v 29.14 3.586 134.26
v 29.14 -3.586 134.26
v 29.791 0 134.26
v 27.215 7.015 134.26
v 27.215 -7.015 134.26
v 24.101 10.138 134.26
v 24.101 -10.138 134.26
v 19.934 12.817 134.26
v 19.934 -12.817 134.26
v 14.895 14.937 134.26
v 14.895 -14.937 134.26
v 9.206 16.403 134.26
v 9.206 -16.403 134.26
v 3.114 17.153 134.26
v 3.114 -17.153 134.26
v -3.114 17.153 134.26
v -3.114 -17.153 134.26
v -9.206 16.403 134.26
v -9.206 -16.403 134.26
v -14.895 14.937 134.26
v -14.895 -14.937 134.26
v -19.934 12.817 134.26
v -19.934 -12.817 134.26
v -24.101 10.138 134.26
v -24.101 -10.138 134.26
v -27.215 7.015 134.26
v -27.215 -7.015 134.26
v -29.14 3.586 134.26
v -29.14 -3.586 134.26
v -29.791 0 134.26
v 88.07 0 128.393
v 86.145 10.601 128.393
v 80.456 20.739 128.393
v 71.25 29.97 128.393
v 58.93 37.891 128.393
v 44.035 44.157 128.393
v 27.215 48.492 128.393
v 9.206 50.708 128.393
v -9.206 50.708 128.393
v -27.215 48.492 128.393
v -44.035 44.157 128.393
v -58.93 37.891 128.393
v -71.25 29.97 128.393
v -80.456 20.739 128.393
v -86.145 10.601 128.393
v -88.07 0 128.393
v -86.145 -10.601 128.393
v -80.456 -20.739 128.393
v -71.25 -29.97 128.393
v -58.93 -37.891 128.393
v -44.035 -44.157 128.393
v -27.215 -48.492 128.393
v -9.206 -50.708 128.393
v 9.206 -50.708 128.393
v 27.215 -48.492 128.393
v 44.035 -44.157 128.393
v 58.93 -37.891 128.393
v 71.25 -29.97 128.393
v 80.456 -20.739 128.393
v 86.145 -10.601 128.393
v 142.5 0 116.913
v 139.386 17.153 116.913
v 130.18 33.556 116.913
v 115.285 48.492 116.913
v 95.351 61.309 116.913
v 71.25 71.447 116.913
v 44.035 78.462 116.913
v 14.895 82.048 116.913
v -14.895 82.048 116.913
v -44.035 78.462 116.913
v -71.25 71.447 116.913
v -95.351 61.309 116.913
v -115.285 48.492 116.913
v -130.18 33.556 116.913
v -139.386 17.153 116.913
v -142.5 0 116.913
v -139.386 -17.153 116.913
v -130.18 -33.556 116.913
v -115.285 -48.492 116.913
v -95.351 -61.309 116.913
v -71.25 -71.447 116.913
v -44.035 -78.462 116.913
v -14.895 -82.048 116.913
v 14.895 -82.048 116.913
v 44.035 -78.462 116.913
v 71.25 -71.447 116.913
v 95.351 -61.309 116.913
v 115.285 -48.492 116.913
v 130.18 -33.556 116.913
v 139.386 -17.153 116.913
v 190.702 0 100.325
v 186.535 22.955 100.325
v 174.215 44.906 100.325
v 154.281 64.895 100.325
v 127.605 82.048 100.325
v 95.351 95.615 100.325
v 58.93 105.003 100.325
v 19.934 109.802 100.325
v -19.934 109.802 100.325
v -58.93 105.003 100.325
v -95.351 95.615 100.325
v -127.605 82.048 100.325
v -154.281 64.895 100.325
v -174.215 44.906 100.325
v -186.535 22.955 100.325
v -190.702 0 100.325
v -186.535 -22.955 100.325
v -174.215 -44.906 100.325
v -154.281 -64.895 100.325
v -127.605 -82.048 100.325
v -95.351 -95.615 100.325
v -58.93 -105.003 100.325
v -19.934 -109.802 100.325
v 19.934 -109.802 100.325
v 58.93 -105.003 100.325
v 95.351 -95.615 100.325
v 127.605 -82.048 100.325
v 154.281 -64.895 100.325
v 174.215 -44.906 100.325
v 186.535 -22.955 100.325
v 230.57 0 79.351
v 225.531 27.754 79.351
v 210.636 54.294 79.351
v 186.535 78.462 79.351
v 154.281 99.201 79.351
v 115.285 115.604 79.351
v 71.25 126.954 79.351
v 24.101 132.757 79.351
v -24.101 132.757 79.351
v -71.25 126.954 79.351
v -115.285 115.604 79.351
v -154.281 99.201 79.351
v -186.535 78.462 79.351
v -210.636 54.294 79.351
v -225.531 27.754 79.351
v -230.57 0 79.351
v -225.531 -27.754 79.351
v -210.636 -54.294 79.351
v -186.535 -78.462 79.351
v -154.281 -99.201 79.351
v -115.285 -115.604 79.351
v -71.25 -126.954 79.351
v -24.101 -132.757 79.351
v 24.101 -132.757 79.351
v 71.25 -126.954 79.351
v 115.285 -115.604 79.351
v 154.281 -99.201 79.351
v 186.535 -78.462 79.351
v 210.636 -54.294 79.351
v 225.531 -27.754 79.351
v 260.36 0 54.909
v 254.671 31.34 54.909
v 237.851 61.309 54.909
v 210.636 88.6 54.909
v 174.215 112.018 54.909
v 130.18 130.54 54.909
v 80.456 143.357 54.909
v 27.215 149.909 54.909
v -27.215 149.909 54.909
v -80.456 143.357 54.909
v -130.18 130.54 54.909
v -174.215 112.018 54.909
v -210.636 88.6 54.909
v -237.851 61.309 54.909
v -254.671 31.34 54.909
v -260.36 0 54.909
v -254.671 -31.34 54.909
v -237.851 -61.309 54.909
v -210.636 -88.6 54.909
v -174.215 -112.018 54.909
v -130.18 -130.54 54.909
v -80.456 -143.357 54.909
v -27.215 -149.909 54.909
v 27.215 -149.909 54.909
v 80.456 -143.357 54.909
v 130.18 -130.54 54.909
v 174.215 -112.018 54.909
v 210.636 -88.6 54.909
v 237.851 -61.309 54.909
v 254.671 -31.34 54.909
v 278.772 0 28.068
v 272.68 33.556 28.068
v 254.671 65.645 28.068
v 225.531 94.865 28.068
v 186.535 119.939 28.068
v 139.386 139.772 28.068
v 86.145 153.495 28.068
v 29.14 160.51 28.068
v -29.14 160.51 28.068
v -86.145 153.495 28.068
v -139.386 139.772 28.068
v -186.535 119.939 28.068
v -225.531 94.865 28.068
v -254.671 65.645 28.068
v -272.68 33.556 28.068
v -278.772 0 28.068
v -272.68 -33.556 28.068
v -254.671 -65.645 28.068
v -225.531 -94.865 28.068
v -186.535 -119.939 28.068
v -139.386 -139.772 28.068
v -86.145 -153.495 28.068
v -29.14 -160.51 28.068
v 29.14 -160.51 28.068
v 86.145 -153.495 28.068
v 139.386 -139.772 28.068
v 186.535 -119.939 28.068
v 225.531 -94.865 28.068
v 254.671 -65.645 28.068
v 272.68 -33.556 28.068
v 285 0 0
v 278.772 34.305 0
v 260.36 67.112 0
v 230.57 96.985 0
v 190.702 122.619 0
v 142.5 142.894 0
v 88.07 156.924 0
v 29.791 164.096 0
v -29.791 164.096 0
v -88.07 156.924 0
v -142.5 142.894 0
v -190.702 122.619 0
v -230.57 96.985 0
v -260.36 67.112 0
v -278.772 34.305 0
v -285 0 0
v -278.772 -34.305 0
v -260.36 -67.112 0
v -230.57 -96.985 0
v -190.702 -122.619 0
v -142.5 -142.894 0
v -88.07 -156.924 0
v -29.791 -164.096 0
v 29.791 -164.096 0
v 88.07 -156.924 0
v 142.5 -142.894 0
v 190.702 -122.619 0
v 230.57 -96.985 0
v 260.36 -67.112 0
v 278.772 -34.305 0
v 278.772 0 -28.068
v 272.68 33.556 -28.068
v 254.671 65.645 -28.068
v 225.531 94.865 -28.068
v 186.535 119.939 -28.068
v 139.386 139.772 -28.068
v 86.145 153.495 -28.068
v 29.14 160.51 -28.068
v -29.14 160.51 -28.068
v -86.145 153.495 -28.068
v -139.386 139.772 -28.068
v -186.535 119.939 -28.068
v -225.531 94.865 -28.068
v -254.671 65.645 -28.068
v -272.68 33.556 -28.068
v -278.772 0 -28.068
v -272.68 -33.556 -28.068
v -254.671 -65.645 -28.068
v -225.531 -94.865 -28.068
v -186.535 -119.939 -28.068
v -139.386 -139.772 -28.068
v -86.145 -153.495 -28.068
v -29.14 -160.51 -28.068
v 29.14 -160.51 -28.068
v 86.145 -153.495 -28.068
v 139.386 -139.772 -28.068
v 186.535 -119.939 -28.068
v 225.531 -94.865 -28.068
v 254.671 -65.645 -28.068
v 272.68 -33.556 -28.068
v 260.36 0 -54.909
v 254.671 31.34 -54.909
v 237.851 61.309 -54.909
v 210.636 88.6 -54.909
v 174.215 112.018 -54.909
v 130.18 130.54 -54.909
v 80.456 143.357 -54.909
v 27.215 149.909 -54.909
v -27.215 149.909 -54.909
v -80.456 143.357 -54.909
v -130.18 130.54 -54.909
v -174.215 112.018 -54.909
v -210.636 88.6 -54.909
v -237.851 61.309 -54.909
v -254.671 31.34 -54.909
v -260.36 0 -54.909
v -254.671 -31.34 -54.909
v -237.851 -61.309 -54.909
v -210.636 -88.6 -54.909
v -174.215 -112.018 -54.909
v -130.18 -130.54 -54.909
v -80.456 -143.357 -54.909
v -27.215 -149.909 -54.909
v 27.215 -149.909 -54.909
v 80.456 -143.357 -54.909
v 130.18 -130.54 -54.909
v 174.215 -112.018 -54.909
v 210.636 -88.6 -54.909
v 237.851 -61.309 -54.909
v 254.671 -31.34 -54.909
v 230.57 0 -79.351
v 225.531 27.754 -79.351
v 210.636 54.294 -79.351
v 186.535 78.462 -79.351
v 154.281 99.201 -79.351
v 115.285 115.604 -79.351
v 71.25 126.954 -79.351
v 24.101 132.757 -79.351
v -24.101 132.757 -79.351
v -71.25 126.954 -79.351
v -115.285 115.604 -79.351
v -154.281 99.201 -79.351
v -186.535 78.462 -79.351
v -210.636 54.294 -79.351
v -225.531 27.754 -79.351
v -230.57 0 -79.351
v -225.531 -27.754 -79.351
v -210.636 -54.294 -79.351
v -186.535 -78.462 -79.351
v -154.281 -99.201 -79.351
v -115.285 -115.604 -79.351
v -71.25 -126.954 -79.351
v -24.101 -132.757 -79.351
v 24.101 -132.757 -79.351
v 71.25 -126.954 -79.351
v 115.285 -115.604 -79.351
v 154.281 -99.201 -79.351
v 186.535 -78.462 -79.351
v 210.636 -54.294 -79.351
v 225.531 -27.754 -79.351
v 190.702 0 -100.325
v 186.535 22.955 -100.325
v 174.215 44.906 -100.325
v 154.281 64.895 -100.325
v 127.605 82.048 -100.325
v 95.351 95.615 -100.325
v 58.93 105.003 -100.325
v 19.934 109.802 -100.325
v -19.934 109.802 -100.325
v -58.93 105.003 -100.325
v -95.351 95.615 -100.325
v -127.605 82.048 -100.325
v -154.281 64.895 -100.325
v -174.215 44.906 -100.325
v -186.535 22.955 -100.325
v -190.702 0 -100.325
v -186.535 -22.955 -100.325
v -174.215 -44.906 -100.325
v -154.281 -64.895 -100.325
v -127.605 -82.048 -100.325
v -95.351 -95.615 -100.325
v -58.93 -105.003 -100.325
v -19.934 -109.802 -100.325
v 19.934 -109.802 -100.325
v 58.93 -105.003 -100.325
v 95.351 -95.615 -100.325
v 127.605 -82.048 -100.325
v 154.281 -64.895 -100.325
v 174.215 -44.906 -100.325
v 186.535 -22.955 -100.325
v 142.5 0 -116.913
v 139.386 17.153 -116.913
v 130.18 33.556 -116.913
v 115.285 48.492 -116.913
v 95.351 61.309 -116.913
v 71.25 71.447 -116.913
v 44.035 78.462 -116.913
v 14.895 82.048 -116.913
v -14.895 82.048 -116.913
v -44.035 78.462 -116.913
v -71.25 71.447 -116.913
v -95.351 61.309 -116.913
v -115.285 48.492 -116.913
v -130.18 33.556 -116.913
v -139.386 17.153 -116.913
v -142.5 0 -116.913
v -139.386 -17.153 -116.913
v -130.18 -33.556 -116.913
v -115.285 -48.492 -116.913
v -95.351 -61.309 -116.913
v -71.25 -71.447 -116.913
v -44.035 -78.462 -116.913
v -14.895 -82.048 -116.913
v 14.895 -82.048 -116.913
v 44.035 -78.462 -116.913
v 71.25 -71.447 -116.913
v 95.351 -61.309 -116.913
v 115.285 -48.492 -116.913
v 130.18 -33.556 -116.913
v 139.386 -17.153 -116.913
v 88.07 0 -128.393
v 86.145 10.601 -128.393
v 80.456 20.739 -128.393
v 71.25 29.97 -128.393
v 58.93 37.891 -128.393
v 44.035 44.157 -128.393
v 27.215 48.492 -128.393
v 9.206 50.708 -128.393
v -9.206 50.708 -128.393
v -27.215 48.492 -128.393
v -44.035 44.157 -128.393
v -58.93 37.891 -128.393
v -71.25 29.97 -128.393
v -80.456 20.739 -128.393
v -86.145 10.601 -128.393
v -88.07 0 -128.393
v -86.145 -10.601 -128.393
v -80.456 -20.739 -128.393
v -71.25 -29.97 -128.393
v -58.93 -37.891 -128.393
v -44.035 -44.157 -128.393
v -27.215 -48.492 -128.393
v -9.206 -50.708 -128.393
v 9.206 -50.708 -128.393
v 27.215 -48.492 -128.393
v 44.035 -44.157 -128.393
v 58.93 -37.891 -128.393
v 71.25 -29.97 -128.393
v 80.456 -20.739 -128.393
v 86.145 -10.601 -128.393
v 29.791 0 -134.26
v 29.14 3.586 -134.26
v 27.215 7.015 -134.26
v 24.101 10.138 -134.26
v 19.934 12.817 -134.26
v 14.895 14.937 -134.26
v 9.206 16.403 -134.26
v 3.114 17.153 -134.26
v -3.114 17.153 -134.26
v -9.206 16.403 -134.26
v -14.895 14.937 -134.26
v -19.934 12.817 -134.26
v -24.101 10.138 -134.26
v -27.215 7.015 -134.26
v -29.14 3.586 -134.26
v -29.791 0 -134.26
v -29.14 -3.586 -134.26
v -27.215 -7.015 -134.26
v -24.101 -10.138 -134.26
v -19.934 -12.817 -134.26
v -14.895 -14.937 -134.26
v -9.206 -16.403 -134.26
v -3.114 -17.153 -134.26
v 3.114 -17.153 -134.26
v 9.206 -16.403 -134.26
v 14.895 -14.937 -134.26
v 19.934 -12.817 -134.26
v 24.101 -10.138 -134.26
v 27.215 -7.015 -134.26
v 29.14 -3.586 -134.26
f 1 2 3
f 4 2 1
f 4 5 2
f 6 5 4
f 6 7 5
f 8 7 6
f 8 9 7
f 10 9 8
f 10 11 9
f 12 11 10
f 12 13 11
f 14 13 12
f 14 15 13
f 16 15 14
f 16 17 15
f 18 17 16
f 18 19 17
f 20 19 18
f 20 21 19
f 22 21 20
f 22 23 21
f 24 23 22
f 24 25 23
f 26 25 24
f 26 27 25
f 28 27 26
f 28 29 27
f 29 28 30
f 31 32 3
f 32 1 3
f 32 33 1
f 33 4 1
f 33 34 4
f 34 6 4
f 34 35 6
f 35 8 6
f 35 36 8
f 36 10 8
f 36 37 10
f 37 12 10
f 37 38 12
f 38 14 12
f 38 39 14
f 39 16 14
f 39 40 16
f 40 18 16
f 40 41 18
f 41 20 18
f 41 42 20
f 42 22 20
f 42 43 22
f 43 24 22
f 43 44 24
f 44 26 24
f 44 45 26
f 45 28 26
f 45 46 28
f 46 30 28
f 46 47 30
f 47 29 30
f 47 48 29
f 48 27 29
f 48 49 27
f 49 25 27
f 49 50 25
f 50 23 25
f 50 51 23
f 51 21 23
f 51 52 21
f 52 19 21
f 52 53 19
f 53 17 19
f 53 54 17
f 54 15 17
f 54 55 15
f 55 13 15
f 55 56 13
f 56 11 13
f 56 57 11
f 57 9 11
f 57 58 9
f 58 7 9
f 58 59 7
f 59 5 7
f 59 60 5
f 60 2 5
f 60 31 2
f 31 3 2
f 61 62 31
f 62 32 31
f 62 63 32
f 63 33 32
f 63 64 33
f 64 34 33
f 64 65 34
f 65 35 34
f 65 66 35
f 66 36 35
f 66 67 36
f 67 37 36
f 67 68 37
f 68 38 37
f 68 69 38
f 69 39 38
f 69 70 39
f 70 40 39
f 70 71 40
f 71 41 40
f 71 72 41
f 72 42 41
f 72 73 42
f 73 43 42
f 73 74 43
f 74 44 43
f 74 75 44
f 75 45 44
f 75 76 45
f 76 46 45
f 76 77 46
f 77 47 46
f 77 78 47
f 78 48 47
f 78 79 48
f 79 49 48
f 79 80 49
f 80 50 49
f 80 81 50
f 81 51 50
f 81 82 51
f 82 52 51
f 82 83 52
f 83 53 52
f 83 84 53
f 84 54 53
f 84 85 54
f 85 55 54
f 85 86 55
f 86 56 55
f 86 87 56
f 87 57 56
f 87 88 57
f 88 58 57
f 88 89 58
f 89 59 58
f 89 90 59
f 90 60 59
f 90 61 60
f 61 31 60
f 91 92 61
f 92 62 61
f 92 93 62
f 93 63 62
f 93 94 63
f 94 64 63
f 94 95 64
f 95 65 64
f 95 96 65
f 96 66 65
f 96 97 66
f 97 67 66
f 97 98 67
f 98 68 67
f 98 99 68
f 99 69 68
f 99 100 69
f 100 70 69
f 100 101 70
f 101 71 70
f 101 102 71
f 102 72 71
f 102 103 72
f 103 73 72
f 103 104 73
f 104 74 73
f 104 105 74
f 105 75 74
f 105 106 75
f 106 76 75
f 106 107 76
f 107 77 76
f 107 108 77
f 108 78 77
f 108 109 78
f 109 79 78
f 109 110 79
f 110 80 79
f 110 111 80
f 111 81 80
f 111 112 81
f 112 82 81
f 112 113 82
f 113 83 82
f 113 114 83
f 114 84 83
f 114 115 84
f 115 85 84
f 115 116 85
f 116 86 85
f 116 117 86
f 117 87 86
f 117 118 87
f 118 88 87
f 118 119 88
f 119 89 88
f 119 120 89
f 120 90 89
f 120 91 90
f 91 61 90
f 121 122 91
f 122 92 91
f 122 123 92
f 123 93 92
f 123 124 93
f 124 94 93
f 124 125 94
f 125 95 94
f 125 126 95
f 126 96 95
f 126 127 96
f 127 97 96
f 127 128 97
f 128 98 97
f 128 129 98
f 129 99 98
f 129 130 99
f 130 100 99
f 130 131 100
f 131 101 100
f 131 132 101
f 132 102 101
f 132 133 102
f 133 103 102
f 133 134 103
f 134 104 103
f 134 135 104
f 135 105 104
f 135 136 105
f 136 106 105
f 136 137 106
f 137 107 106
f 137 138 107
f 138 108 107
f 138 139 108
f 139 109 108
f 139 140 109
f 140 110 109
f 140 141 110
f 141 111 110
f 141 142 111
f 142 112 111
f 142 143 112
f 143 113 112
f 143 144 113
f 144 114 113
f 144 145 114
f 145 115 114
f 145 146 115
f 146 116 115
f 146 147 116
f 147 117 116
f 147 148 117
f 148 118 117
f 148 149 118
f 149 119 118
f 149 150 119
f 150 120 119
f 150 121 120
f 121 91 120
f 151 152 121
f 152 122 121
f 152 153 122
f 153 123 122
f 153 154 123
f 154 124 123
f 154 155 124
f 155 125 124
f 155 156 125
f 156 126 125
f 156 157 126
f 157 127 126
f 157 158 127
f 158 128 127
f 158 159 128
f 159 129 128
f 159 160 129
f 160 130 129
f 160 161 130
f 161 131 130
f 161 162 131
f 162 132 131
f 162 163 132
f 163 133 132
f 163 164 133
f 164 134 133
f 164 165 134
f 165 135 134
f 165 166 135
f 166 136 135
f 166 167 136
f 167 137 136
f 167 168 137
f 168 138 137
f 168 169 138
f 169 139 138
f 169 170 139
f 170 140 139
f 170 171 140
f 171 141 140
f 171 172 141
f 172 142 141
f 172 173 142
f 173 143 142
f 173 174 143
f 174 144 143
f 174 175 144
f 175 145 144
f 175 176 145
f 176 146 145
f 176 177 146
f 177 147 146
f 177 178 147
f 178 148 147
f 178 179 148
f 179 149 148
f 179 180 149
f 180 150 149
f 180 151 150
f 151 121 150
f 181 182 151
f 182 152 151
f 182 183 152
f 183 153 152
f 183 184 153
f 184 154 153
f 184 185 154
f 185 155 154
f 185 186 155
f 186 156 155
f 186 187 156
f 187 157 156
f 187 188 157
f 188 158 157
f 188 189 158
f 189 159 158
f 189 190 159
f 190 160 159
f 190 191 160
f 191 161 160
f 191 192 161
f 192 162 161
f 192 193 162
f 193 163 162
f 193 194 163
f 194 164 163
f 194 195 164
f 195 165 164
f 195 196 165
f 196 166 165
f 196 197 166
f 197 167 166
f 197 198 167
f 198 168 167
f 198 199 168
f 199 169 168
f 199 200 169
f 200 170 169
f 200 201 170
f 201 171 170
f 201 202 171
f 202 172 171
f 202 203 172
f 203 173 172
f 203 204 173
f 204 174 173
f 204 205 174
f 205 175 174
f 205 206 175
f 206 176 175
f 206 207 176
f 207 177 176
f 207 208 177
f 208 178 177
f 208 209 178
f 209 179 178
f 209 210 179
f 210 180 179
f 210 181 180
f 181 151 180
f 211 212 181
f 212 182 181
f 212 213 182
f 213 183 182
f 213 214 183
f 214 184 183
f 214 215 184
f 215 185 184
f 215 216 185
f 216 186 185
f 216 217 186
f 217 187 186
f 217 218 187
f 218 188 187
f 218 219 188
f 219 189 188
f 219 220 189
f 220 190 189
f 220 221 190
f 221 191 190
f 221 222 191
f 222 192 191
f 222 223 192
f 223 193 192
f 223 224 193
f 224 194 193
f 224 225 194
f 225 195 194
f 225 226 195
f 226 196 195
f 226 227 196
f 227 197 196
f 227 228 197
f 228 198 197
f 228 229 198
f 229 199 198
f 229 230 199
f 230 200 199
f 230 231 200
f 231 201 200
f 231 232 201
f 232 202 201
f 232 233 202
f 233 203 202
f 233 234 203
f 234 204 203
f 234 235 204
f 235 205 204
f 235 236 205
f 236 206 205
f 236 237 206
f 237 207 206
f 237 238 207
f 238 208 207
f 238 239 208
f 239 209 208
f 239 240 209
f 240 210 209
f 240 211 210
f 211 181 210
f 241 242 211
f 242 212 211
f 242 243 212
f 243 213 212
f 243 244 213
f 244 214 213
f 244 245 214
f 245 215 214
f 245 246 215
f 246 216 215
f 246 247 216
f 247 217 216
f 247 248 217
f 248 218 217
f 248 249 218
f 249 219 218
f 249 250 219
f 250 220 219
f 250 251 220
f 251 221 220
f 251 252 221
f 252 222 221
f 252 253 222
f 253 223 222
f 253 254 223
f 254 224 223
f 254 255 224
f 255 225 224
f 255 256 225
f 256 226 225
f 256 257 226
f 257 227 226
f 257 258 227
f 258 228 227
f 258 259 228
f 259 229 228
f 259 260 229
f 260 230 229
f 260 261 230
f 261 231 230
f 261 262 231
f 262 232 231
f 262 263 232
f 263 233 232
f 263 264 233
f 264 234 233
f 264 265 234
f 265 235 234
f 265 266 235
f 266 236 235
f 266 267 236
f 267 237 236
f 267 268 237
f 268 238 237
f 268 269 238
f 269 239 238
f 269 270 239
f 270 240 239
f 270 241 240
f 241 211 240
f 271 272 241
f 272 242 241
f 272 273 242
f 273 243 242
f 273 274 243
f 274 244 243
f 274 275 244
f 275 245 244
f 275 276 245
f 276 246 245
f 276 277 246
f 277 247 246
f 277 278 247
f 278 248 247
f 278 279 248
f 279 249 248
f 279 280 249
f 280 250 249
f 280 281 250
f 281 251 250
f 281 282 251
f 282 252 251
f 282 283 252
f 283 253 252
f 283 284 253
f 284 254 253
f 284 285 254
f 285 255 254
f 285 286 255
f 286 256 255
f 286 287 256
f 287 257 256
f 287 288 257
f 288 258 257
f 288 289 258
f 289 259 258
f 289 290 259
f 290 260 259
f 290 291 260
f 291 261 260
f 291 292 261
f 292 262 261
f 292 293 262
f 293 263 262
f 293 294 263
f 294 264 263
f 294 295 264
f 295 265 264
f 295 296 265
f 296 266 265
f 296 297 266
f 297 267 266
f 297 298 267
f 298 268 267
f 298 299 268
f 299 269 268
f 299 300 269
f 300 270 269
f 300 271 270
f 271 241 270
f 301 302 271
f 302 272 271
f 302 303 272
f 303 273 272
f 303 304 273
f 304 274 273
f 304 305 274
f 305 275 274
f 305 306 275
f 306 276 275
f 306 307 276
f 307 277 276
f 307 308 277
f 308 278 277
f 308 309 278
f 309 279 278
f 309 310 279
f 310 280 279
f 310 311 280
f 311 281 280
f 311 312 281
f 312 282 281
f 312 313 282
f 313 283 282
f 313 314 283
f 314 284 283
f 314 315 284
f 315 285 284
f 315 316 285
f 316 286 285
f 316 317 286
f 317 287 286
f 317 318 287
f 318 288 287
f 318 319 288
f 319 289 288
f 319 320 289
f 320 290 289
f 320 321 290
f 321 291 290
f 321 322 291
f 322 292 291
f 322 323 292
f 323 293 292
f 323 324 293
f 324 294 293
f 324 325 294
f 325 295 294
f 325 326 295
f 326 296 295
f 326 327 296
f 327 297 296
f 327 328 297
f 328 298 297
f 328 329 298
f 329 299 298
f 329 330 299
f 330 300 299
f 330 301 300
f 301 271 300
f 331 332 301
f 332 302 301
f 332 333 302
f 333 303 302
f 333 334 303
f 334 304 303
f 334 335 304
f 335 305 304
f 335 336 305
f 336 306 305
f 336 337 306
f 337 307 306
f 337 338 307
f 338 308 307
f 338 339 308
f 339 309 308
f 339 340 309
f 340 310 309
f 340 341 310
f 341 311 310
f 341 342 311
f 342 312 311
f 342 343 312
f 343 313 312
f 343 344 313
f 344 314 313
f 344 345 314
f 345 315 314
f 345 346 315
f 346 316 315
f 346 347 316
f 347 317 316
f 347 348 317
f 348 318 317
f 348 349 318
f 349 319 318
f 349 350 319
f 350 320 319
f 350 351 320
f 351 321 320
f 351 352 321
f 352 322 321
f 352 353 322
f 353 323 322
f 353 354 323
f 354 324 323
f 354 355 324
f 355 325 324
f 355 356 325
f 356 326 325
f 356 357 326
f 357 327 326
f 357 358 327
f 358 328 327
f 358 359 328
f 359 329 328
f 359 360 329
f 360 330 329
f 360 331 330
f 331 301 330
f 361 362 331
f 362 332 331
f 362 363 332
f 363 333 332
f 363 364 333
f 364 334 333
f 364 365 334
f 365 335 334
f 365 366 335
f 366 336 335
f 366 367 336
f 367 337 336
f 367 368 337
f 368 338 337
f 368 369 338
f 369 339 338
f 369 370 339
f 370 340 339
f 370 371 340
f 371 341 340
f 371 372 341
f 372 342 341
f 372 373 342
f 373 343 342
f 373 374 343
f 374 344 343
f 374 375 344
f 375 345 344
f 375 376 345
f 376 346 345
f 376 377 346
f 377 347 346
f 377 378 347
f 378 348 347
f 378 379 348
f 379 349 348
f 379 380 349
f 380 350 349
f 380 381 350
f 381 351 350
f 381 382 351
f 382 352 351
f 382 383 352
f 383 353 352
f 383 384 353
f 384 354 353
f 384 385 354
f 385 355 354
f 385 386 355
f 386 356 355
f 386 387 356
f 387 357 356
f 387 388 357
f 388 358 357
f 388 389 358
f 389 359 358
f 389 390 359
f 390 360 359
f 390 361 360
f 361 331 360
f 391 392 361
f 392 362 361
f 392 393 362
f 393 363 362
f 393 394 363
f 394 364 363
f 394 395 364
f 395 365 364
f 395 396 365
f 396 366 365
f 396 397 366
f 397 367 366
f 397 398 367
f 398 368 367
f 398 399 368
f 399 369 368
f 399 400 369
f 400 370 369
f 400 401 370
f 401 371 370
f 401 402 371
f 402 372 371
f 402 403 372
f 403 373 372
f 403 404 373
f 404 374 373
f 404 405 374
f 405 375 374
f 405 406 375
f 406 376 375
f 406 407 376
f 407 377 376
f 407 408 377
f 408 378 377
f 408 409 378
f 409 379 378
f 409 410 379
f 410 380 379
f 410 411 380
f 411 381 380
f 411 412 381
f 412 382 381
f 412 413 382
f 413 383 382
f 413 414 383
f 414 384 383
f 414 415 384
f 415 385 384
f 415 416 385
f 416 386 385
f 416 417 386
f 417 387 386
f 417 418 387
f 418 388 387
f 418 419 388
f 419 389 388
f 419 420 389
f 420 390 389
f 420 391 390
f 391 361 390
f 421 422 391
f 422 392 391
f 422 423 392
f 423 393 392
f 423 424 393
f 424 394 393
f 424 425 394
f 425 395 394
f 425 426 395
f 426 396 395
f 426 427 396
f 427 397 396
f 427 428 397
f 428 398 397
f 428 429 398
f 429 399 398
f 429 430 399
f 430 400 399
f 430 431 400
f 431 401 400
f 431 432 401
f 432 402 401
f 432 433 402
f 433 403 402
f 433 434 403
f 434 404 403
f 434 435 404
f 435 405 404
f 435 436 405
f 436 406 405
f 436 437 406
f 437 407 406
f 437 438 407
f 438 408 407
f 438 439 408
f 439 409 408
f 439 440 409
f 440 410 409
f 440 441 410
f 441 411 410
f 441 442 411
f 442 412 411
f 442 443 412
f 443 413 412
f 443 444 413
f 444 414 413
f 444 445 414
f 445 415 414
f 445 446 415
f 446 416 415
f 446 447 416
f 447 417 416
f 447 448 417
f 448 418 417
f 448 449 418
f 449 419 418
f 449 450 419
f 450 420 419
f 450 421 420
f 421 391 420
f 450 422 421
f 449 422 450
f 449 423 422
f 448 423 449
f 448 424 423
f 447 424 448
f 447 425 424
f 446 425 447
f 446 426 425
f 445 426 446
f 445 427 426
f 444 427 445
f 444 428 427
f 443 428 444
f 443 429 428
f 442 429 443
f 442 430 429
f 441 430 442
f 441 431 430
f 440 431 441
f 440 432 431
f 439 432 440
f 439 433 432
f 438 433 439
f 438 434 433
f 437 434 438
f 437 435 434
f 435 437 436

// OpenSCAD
// Generated by SolidPython 1.0.1 on 2020-07-29 00:46:54


scale(v = [19, 11, 9]) {
	sphere(r = 15);
}
/***********************************************
*********      SolidPython code:      **********
************************************************
 
# import packages: SolidPython
from solid import *
from solid.utils import *
from itertools import chain, combinations, permutations


class Resize:

    def __init__(self, scad_file):
        self.scad_file = scad_file
        #self.scad_file = import_scad(scad_file)
        # cone/cylinder param:
        self.r1 = 0
        self.r2 = 0
        self.h = 0
        # rectangular prism param:
        self.w = 0
        self.l = 0
        # ellipse param:
        self.r = 0

    # import OpenScad code (file name corresponds to shape)


    # classify shape + parameters
    def assign(self, param1, param2, param3):
        if self.scad_file == 'cone.scad':
            self.r1 = param1
            self.r2 = param2
            self.h = param3
        elif self.scad_file == 'cylinder.scad':
            self.r1 = param1
            self.r2 = param2
            self.h = param3
        elif self.scad_file == 'rectangularPrism.scad':
            self.h = param1
            self.l = param2
            self.w = param3
        else:
            self.r = param1
            self.h = param2

    # resize parameters
    def iterate(self):
        x = range(3, 20, 2)
        i = 1
        if self.scad_file == 'cone.scad':
            tempList = list(permutations(x, 2))
            for temp in tempList:
                param1 = temp[0]
                param2 = temp[1]
                filepath = 'produced_scad_files/' + 'cone' + str(param1) + '_' + str(param2) + '_' + '.scad'
                scad_render_to_file(cylinder(h=param1, r1=param2, r2=0), filepath)

        elif self.scad_file == 'cylinder.scad':
            tempList = list(permutations(x, 3))
            for temp in tempList:
                param1 = temp[0]
                param2 = temp[1]
                filepath = 'produced_scad_files/' + 'cylinder' + str(param1) + '_' + str(param2) + '_' + '.scad'
                scad_render_to_file(cylinder(h=param1, r1=param2, r2=param2), filepath)

        elif self.scad_file == 'rectangularPrism.scad':
            tempList = list(permutations(x, 3))
            for temp in tempList:
                param1 = temp[0]
                param2 = temp[1]
                param3 = temp[2]
                filepath = 'produced_scad_files/' + 'rectangularPrism' + str(param1) + '_' + str(param2) + '_' + str(
                    param3) + '.scad'
                scad_render_to_file(cube(size=(param1, param2, param3)), filepath)

        elif self.scad_file == 'ellipse.scad':
            tempList = list(permutations(x, 4))
            for temp in tempList:
                param1 = temp[0]
                param2 = temp[1]
                param3 = temp[2]
                param4 = temp[3]
                filepath = 'produced_scad_files/' + 'ellipse' + str(param1) + '_' + str(param2) + '_' + str(param3) + '_' + str(param4) + '.scad'
                scad_render_to_file(scale([param1, param2, param3])(sphere(r=param4)), filepath)

    def render_to_scadfile(self):
        scad_render_to_file(scad, 'example.scad') 
 
************************************************/
